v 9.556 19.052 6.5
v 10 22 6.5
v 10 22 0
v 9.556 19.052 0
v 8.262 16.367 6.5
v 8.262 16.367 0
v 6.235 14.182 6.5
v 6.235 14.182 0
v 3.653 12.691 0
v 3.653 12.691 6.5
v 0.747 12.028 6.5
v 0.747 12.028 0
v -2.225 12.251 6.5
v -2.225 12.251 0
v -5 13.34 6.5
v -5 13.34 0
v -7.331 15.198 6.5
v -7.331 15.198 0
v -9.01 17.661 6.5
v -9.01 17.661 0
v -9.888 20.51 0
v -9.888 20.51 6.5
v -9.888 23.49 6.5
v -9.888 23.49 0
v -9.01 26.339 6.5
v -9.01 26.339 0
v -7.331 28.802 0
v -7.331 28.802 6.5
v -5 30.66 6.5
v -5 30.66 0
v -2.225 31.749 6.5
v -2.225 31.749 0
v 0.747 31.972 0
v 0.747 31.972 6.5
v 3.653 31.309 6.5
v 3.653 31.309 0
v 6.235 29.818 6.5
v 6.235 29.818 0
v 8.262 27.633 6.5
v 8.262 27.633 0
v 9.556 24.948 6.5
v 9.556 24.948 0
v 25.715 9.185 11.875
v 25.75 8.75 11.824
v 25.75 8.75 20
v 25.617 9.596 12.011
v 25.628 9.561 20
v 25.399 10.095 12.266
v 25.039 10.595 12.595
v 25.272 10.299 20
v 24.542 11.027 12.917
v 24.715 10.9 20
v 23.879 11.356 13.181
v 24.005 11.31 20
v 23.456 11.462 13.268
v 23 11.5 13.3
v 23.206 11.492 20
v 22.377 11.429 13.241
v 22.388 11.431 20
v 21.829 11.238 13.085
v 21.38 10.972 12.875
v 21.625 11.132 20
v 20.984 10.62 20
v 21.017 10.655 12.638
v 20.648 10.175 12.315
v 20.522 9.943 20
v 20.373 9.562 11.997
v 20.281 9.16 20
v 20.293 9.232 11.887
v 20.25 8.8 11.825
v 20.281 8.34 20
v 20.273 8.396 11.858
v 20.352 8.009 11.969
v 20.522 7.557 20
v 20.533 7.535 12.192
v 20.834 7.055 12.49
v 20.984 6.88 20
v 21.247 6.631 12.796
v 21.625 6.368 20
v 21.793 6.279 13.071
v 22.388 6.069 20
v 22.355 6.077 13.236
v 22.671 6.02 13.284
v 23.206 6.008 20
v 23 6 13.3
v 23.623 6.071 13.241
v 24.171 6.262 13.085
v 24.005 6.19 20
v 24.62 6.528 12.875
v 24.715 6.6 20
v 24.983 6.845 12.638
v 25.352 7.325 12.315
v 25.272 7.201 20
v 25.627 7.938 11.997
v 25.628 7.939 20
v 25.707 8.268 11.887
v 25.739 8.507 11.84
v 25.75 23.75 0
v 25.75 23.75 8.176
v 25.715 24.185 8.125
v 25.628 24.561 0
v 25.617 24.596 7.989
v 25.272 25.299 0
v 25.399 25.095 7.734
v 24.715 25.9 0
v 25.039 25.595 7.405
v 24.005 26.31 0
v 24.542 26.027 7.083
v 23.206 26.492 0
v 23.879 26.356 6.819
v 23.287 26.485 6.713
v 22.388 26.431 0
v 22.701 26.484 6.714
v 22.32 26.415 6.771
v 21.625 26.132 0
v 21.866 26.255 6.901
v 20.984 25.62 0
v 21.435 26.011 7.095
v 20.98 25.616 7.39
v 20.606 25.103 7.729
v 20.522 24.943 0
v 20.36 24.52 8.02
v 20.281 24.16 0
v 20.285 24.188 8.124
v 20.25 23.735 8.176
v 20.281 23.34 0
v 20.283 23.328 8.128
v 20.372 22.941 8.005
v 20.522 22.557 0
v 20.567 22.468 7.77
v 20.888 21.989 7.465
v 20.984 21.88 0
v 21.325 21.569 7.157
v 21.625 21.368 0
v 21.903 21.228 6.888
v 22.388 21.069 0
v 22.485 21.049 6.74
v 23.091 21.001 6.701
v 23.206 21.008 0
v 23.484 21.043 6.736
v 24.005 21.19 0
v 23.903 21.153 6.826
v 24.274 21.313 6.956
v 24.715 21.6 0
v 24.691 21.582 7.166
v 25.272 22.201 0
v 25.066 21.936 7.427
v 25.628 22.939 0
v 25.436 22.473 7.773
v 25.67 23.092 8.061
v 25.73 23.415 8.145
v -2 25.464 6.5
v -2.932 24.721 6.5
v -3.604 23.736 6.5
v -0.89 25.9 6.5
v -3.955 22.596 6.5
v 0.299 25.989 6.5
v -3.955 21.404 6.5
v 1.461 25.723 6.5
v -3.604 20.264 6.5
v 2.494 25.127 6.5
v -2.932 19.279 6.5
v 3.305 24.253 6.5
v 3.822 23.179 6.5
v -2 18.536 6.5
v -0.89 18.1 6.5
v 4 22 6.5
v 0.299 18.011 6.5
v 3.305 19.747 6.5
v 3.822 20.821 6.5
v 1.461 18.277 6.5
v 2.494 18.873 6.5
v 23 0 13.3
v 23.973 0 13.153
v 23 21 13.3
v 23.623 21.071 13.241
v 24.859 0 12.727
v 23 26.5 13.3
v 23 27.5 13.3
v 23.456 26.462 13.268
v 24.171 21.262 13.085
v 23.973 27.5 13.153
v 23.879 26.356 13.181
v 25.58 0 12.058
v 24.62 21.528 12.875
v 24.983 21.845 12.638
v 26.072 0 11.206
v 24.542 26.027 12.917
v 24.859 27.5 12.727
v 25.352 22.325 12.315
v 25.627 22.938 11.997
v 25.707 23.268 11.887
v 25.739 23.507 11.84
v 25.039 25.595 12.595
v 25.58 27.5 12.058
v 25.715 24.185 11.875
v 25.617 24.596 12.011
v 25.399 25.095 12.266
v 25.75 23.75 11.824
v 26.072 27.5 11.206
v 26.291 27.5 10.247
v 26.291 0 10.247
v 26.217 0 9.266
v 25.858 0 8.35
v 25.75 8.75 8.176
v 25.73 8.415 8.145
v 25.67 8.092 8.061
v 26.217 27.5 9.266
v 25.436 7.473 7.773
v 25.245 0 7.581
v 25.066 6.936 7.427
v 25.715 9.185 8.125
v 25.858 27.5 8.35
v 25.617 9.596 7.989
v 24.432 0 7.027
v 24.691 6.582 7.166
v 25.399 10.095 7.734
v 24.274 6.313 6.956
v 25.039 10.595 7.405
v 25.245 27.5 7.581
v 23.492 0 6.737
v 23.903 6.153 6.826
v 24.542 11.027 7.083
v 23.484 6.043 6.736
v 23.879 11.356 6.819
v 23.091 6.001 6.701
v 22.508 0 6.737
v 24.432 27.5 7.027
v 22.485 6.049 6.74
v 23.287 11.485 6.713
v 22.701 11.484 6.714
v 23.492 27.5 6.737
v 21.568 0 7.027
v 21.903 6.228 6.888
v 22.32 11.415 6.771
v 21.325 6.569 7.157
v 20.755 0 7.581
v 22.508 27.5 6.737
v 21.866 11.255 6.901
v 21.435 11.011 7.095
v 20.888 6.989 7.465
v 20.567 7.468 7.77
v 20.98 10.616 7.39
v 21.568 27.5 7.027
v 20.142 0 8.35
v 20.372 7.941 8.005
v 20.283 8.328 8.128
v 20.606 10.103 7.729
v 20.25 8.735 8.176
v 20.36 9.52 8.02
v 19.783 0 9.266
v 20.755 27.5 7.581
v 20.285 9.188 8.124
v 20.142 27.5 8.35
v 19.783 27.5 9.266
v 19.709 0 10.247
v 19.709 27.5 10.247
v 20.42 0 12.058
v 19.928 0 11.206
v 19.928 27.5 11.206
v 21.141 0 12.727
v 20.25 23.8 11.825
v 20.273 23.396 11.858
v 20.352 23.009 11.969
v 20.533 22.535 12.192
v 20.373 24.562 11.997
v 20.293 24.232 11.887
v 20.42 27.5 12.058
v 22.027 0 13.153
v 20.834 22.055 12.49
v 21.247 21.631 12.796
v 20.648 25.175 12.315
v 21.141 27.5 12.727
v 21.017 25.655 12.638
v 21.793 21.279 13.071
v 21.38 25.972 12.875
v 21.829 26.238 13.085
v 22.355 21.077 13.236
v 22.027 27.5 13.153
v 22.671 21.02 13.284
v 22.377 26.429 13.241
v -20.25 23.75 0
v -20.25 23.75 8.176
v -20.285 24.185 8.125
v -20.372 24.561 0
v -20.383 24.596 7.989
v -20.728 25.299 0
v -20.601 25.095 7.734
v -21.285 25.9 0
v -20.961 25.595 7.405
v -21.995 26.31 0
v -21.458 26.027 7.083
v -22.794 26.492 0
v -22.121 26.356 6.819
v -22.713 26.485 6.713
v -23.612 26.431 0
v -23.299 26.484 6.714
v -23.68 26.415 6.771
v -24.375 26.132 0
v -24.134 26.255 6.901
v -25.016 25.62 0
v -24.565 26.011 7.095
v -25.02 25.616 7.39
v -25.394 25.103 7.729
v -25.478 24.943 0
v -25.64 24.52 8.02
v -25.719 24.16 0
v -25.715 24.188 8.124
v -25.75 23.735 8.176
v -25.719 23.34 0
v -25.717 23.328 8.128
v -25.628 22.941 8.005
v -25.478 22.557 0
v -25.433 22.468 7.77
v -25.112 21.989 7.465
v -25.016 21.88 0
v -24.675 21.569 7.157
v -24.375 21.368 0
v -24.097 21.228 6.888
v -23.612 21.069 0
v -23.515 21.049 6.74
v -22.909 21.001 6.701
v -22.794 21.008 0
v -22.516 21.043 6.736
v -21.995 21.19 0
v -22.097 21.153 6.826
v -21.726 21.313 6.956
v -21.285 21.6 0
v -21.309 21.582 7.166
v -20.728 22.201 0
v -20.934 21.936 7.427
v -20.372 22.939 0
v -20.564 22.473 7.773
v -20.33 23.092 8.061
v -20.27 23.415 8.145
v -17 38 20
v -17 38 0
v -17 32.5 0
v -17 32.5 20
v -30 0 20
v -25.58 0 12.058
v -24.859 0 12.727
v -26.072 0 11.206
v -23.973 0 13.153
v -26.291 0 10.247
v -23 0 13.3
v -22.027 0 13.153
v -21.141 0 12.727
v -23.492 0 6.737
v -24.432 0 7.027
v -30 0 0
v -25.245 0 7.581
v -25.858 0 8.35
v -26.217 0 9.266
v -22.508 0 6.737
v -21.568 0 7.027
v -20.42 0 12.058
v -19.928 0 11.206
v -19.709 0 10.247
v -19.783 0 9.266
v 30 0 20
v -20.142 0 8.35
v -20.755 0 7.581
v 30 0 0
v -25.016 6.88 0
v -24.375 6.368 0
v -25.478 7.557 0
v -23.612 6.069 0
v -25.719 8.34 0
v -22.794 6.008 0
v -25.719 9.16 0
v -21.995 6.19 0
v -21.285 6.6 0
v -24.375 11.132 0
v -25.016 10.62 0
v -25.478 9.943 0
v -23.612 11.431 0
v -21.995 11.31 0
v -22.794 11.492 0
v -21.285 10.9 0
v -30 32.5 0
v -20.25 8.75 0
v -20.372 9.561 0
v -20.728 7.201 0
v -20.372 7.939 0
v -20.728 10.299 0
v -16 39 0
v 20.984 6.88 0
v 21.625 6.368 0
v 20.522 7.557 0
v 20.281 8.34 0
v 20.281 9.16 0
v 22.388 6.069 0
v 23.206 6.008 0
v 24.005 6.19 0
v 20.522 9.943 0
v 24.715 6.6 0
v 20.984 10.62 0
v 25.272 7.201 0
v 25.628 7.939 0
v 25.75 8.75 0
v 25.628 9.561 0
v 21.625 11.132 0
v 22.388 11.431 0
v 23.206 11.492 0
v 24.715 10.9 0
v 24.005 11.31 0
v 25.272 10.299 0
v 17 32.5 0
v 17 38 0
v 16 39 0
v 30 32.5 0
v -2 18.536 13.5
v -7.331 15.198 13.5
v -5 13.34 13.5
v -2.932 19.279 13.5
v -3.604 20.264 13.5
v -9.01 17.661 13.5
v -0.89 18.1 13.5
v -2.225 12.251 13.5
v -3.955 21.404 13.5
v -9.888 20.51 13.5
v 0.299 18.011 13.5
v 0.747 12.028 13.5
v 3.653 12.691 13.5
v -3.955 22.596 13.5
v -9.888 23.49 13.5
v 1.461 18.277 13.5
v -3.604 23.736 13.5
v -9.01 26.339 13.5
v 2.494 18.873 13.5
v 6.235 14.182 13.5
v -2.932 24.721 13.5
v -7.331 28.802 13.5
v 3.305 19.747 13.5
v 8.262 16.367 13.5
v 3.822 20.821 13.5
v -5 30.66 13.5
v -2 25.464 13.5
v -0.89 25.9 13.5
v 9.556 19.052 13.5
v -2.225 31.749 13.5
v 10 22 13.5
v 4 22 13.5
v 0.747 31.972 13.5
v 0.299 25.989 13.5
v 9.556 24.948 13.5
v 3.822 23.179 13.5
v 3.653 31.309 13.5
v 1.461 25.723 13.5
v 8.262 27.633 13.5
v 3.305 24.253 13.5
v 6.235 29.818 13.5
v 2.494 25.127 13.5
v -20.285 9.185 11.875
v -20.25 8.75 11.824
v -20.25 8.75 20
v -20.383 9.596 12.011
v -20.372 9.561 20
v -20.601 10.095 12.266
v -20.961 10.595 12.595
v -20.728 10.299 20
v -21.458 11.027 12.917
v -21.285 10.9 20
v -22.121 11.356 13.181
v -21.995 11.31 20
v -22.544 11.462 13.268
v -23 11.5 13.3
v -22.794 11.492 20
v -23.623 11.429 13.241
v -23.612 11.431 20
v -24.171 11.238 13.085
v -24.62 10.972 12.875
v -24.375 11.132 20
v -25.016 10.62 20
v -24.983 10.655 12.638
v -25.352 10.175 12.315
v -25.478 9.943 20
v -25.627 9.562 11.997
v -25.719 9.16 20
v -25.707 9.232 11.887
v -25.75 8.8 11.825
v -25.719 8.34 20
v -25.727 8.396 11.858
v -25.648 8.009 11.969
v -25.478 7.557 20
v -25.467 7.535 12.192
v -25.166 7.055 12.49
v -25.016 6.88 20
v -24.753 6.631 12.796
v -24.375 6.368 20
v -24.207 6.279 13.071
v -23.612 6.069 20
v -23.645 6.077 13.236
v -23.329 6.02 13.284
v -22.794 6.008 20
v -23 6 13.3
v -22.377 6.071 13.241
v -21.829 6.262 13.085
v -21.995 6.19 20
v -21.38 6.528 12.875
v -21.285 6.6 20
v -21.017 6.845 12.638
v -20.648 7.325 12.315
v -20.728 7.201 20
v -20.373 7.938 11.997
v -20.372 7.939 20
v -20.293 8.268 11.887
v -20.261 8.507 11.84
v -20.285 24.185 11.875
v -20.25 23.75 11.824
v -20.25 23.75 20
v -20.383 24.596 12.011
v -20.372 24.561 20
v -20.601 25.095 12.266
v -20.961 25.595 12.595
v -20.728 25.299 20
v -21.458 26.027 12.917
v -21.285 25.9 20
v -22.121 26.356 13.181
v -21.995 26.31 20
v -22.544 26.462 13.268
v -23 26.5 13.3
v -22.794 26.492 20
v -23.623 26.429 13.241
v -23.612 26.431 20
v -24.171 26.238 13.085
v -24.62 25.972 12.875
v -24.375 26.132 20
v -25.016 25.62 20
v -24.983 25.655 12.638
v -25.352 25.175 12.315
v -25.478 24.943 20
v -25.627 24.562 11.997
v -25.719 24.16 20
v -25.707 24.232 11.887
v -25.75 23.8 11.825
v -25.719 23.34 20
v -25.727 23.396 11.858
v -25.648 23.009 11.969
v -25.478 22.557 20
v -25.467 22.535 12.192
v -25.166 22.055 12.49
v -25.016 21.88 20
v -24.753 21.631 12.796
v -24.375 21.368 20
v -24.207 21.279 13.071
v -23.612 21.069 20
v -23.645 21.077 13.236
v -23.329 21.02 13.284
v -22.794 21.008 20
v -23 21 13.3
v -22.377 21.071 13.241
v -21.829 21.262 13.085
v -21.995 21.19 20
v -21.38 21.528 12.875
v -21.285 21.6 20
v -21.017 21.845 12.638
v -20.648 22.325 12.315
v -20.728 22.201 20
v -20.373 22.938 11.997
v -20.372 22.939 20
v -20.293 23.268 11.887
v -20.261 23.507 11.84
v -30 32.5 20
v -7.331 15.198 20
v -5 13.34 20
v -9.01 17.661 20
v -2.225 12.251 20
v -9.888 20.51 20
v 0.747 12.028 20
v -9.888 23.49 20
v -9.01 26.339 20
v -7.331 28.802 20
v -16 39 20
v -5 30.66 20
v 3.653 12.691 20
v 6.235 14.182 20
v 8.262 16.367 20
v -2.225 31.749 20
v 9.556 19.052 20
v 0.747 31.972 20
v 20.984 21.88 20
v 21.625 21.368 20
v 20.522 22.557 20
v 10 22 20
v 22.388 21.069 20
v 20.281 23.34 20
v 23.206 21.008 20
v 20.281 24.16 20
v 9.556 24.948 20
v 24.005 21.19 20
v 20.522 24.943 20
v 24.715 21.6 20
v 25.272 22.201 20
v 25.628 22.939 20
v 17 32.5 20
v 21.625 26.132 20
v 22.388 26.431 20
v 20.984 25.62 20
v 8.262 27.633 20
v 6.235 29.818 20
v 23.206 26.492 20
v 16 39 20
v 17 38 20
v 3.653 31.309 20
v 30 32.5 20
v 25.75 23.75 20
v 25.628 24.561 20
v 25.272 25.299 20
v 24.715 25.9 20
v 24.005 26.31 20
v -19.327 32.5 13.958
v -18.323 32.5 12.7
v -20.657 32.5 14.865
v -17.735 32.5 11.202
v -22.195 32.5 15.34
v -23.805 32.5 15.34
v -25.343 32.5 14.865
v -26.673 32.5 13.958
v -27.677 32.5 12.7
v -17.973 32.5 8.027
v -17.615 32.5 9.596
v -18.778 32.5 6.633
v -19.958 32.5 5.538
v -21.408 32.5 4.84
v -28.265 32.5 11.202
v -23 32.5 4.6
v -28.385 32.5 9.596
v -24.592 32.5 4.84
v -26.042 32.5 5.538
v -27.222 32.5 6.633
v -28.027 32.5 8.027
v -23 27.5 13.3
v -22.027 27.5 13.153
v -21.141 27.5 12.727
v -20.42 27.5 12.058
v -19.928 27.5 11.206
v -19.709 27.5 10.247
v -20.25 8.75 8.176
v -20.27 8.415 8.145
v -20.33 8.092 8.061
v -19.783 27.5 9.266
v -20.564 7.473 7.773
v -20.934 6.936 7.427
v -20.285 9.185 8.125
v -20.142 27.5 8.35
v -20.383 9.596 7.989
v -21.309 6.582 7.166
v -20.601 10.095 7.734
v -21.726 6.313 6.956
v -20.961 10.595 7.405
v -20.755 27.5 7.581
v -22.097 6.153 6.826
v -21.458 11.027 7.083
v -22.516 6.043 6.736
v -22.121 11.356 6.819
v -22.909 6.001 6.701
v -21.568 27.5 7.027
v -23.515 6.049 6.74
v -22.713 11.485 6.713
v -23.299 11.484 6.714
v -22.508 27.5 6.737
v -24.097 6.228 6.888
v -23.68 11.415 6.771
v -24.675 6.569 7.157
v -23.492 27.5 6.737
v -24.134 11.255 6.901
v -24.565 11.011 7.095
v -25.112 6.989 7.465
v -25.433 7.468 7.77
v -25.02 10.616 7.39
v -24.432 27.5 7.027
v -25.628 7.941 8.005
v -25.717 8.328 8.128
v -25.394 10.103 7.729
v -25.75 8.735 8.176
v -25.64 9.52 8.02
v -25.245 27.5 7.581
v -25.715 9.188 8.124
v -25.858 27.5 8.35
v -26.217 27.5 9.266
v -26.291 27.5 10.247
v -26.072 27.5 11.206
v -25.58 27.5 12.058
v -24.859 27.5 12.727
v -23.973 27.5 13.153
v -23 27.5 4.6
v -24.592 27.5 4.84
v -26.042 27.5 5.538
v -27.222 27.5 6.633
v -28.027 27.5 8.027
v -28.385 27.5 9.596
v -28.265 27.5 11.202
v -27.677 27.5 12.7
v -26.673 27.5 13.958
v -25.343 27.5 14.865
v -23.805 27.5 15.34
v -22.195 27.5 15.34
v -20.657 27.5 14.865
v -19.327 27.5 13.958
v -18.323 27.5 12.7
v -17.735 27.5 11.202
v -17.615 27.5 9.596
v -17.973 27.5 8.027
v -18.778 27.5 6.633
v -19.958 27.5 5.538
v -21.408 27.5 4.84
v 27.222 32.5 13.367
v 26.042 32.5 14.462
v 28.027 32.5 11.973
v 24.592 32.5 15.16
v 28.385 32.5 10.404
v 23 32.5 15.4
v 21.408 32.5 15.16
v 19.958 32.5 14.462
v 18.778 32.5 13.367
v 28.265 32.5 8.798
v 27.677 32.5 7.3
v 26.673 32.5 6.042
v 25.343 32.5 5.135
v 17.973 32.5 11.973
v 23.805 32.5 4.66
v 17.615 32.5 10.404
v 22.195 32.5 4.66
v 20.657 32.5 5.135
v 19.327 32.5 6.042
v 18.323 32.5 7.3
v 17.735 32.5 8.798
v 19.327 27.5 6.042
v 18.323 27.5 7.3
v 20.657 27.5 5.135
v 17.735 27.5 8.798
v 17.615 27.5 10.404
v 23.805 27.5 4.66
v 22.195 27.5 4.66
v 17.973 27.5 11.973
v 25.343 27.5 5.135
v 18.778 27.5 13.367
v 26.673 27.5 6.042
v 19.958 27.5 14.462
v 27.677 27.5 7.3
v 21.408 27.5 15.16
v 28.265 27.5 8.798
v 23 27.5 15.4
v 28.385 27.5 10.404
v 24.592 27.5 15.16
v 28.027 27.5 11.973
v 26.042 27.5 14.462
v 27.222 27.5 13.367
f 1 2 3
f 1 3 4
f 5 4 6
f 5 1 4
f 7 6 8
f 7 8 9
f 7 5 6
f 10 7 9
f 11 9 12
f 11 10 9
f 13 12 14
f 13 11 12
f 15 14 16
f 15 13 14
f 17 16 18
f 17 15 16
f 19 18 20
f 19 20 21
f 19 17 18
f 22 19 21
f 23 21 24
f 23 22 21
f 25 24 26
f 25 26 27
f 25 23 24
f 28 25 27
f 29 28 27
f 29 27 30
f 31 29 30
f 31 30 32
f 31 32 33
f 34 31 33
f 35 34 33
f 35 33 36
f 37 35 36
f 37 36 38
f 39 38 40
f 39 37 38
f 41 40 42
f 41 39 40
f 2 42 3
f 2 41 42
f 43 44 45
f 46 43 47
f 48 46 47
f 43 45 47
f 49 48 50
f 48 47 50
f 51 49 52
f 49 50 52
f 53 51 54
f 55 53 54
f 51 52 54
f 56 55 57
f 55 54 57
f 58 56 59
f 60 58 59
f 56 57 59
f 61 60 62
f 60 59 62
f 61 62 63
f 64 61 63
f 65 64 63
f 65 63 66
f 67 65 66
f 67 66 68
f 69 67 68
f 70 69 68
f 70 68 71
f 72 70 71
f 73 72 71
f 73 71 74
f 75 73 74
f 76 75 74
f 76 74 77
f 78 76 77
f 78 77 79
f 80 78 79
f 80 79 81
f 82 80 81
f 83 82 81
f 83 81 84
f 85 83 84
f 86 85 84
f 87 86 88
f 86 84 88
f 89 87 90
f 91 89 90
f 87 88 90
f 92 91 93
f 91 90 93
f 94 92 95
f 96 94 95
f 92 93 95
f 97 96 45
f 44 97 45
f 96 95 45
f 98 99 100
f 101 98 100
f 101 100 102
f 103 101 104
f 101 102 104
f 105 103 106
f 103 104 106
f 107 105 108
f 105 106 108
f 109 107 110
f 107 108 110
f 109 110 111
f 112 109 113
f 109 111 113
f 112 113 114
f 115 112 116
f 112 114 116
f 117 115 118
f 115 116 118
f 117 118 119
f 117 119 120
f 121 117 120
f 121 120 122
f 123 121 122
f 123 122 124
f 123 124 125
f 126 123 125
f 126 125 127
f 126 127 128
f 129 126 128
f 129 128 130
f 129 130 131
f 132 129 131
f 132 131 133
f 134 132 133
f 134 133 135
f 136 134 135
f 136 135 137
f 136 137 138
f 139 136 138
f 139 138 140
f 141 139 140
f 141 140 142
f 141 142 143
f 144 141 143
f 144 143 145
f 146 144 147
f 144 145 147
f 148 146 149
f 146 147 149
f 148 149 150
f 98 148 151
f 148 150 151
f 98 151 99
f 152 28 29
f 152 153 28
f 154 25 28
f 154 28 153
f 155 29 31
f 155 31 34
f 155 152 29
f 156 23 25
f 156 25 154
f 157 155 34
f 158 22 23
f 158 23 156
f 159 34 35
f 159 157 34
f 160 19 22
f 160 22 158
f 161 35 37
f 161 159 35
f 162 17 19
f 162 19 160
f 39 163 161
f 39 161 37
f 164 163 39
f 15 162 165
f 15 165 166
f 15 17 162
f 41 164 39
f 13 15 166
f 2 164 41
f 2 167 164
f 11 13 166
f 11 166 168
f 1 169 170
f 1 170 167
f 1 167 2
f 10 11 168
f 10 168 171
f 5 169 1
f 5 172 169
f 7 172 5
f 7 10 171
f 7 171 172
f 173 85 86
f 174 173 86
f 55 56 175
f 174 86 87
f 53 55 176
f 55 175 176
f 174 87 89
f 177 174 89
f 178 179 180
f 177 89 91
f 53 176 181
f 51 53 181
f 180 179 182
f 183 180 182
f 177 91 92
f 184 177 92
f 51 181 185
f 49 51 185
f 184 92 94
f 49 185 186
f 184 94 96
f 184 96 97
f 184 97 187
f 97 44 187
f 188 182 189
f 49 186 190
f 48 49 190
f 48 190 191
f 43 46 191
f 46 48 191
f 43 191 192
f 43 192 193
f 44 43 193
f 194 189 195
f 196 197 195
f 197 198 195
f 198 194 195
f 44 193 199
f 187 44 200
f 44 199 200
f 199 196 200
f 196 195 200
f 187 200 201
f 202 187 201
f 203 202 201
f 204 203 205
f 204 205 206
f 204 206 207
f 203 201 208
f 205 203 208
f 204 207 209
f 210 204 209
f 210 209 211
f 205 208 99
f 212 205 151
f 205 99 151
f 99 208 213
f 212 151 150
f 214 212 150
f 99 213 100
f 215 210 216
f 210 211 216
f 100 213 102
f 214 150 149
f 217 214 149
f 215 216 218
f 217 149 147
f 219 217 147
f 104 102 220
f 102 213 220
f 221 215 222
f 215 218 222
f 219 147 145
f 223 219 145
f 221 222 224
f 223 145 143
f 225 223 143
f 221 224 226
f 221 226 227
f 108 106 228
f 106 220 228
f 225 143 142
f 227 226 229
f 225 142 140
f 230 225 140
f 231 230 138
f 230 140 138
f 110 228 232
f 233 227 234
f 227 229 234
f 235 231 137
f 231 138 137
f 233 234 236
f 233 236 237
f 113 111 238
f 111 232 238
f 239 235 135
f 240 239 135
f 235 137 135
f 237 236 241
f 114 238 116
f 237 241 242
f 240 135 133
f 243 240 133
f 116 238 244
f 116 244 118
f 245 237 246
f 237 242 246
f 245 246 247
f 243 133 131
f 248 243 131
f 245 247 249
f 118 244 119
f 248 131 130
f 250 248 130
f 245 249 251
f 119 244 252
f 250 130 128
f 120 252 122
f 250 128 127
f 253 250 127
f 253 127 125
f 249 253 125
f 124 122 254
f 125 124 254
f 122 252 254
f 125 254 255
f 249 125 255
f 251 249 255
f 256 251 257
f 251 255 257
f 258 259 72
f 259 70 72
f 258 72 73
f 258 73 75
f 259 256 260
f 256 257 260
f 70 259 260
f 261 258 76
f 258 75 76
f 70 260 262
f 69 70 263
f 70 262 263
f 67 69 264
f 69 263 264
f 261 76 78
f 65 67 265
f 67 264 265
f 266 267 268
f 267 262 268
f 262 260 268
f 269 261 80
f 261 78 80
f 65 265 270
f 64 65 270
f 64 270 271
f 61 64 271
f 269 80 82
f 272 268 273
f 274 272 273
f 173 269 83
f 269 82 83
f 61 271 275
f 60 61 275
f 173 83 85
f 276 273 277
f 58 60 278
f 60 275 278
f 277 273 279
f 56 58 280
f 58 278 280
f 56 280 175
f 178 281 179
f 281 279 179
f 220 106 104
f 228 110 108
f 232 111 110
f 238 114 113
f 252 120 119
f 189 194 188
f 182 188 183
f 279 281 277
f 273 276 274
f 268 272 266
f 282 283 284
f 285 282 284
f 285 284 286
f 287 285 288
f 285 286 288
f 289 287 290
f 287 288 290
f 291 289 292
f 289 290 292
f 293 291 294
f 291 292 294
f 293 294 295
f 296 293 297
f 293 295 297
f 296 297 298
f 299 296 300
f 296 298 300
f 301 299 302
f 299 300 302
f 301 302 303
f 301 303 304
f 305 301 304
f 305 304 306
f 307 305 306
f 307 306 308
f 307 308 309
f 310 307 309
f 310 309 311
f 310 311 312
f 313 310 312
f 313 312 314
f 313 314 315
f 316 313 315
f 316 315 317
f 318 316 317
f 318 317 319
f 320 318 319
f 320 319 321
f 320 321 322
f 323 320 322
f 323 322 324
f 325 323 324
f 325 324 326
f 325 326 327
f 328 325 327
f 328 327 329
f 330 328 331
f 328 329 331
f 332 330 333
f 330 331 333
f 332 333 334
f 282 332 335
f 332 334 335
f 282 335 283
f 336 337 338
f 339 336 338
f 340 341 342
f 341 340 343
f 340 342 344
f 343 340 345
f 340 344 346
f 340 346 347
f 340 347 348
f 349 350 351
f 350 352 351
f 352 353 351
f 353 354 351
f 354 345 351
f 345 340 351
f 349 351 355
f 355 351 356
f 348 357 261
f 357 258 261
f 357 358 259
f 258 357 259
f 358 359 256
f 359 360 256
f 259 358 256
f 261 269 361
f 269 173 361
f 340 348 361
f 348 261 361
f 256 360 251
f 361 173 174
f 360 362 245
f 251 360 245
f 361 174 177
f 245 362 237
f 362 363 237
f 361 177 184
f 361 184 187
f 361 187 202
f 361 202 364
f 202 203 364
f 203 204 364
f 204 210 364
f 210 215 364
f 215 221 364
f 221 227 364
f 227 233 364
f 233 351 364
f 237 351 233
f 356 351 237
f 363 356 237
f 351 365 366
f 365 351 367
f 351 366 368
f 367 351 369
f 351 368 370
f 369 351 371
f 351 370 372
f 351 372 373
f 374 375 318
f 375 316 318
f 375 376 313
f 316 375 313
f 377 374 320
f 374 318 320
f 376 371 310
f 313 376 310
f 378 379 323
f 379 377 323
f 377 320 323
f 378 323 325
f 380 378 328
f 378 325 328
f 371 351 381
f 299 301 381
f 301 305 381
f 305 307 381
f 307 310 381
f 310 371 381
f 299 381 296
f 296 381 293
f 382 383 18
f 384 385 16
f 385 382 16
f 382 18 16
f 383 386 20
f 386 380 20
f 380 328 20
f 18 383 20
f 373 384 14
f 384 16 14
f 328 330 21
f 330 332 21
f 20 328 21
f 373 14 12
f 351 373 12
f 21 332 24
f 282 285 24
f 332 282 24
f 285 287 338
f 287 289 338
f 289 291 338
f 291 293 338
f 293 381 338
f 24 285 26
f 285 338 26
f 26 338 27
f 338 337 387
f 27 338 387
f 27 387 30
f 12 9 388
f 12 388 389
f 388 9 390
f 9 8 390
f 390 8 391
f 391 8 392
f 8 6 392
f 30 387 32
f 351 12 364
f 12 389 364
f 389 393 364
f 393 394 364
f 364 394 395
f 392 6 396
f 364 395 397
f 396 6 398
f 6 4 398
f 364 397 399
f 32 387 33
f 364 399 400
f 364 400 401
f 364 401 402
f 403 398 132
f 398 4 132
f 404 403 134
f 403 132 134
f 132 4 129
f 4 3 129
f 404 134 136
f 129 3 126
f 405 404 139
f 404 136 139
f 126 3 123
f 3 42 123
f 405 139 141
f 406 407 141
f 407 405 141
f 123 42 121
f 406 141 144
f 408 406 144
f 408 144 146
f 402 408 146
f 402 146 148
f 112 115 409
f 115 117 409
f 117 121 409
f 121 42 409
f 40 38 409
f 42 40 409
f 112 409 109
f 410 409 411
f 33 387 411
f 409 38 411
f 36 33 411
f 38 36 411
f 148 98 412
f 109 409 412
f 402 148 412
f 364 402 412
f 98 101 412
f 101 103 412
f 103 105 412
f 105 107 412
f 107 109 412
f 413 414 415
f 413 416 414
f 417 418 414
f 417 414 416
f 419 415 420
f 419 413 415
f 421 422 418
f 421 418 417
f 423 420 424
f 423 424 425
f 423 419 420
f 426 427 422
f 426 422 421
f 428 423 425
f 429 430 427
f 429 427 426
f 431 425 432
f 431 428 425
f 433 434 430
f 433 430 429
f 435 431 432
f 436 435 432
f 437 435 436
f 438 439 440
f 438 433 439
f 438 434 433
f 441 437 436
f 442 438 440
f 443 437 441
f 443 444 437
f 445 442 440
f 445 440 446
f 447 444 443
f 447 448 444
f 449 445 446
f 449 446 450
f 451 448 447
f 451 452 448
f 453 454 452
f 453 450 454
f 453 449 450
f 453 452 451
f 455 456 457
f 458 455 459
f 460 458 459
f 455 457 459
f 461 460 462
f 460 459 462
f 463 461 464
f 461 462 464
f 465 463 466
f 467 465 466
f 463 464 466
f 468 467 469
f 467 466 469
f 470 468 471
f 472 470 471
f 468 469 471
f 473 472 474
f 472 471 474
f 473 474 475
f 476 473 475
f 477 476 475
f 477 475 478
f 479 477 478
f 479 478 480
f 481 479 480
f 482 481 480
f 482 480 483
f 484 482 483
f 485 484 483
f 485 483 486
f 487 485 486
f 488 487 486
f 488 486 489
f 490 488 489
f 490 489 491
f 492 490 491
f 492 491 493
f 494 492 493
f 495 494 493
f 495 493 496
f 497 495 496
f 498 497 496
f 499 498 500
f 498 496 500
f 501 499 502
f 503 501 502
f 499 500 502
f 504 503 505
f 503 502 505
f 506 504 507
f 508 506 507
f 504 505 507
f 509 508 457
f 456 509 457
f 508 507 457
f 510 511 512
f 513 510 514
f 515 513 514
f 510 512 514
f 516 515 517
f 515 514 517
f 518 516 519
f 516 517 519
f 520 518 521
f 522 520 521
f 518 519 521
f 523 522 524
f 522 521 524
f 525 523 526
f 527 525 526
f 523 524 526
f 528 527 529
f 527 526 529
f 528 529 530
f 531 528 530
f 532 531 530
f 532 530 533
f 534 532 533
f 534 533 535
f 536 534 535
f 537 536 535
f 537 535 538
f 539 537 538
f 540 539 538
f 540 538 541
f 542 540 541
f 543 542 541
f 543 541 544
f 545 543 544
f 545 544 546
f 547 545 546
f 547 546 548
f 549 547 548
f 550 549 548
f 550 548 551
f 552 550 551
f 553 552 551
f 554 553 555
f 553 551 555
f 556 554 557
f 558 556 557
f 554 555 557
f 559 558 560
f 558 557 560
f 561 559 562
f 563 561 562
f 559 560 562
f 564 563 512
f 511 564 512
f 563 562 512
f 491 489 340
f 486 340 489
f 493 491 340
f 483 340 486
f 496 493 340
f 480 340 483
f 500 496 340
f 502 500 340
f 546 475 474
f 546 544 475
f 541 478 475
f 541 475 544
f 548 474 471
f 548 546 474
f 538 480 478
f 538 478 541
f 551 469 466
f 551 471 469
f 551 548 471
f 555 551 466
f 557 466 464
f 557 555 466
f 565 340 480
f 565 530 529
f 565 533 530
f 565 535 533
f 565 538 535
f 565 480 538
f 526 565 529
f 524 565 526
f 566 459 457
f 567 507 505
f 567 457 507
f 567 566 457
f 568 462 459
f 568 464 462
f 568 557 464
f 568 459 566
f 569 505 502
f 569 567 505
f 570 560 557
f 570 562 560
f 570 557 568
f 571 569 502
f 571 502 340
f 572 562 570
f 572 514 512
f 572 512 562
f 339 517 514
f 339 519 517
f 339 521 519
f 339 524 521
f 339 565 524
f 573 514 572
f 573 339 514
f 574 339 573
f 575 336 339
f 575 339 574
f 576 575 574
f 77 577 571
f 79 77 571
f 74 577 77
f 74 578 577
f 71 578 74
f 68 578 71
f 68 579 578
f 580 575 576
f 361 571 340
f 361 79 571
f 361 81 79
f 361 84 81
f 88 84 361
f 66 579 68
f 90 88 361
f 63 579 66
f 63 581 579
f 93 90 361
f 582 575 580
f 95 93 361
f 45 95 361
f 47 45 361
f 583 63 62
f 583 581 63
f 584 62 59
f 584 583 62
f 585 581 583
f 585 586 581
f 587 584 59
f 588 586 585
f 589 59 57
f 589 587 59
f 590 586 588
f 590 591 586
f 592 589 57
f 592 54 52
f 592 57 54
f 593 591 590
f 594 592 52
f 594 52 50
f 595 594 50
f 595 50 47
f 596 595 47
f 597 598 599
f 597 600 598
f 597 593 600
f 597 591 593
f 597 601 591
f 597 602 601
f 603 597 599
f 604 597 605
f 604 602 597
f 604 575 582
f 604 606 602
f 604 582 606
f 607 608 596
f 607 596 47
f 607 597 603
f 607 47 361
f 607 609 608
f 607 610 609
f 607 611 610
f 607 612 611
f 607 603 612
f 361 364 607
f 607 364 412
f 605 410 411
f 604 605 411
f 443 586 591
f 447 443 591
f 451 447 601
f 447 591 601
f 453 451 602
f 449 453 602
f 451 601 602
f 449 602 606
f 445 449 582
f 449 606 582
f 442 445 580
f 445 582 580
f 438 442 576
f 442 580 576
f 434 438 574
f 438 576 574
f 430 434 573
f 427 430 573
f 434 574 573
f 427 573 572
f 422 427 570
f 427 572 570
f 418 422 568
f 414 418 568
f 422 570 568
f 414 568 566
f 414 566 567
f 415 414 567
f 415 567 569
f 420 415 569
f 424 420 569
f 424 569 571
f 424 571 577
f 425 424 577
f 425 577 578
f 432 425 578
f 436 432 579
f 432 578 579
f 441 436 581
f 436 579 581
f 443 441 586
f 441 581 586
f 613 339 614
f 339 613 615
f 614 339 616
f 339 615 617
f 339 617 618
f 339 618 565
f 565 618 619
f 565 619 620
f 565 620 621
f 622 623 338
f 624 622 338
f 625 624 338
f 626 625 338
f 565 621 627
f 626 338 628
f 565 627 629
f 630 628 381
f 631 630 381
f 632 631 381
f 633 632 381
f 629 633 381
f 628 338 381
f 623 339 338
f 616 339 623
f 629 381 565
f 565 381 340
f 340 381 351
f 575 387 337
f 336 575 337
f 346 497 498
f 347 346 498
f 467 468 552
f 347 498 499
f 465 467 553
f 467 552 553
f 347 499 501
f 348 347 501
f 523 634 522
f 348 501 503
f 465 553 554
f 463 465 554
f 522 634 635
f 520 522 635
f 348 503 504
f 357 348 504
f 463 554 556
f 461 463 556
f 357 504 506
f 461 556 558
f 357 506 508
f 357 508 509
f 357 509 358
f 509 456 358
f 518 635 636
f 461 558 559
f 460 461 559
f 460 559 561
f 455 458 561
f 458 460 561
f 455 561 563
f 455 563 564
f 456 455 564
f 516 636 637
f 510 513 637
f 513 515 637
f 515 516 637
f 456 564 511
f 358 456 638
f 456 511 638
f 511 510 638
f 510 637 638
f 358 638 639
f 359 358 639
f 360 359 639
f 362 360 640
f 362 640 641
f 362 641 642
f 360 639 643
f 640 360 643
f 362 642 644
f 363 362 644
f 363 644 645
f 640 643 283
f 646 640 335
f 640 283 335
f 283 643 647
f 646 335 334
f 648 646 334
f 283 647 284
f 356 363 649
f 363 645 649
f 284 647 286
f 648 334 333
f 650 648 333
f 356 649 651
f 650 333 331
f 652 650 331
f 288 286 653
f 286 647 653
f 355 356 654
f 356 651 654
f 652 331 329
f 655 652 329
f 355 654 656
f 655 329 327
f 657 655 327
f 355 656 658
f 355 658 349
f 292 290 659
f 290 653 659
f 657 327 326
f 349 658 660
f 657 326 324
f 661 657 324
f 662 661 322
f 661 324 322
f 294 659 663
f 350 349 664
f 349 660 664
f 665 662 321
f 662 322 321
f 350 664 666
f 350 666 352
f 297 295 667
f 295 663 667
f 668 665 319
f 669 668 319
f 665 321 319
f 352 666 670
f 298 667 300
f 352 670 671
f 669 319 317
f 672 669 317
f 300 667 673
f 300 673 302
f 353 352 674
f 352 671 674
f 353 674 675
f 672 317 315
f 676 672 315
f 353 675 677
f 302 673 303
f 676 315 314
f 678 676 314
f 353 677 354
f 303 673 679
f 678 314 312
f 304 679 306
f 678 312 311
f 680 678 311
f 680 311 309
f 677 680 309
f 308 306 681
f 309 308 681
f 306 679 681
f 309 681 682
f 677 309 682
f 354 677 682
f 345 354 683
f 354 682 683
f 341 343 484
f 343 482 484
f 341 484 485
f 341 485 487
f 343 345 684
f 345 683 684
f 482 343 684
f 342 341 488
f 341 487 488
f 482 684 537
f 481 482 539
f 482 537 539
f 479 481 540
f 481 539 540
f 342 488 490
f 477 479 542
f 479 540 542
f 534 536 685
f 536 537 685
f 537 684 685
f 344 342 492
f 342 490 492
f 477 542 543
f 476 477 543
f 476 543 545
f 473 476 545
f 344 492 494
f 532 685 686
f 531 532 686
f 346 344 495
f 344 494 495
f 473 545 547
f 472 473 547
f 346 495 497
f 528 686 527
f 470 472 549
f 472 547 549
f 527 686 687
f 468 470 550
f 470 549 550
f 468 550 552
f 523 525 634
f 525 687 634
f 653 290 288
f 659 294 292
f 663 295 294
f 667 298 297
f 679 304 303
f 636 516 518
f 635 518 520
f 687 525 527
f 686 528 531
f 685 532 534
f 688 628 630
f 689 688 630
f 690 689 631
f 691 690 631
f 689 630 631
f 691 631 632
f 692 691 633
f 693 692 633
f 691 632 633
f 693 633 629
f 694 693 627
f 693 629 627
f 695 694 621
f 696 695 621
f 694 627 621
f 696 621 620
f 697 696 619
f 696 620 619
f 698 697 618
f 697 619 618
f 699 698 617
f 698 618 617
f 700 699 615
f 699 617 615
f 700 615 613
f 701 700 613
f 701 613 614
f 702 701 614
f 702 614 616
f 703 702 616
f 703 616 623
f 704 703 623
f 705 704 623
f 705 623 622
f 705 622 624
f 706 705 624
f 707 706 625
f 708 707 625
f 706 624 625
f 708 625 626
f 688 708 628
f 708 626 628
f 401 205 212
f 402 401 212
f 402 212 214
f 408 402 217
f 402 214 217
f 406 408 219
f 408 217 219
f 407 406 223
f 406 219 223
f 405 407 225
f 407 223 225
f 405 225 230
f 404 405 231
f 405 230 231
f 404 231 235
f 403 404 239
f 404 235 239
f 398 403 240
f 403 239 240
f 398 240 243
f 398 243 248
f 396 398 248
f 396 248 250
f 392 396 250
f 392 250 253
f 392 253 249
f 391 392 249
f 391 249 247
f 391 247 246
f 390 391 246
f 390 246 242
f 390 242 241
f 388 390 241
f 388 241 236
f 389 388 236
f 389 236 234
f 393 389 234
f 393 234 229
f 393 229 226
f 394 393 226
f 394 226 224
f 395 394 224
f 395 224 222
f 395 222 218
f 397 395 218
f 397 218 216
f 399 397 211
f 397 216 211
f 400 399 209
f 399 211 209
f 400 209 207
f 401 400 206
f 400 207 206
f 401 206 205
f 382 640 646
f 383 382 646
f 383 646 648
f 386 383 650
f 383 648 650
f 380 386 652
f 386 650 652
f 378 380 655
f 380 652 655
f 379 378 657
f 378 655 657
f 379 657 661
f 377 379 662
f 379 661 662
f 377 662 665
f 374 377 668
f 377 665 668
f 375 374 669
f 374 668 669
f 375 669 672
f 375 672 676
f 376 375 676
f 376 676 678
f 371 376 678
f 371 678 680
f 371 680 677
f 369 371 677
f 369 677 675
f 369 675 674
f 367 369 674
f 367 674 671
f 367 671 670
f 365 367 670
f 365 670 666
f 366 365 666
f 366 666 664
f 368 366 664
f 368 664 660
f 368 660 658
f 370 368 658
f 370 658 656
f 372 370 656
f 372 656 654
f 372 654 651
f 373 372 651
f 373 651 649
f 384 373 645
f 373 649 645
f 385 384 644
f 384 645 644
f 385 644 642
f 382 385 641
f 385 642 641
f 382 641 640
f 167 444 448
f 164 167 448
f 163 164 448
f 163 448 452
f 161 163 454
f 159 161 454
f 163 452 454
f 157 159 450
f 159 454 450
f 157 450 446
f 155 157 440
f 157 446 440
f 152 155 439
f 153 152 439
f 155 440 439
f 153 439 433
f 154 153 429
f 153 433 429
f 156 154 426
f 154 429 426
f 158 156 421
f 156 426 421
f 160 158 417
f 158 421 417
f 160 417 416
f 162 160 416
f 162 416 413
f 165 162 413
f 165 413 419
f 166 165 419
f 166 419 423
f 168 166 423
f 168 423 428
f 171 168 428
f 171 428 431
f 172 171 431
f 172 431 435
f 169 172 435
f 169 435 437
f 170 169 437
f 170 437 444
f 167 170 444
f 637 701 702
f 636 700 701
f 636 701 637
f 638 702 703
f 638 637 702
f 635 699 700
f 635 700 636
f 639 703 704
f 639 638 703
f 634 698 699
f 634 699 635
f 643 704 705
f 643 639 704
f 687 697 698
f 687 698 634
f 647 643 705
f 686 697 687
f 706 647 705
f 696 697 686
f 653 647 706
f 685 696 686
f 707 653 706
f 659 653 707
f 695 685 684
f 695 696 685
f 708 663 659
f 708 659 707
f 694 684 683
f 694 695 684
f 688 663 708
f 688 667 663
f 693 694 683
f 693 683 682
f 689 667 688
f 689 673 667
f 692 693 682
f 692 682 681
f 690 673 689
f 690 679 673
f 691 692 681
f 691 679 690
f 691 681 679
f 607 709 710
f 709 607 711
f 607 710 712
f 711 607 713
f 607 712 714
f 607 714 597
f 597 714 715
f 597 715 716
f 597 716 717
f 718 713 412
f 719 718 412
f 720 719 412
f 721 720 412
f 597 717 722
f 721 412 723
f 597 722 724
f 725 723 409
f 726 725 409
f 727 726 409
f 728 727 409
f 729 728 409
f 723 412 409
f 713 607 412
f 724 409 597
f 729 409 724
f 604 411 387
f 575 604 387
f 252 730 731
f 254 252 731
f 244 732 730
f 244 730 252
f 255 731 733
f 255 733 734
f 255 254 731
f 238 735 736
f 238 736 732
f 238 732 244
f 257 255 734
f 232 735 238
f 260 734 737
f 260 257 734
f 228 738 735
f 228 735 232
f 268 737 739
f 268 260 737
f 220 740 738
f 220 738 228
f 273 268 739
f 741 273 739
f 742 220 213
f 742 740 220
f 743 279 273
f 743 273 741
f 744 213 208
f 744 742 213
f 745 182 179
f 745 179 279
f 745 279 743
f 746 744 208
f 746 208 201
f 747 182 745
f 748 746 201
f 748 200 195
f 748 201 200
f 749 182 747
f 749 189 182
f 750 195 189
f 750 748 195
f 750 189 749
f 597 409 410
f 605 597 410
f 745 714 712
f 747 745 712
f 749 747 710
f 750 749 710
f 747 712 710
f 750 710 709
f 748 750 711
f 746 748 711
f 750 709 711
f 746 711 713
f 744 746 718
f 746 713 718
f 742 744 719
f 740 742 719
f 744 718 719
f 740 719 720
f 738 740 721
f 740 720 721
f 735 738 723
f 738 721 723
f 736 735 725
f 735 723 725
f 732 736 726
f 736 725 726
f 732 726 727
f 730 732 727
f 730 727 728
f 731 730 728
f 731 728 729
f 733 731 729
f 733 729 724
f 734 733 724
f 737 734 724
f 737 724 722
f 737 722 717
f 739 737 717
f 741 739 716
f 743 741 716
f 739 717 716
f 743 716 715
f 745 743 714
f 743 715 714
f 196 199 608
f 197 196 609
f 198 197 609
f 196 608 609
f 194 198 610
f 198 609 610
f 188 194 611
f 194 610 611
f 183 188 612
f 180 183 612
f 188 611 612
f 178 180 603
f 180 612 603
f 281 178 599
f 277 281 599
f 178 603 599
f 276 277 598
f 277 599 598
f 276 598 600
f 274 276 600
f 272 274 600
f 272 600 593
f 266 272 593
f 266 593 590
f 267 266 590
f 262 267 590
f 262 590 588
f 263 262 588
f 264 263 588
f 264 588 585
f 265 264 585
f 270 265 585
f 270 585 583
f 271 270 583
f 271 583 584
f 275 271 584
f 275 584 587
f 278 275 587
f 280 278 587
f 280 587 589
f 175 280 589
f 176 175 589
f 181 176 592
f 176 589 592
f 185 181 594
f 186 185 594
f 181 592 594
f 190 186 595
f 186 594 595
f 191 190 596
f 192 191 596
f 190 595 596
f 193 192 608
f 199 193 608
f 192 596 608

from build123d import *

# Parameters (mm, degrees)
AUFSATZ_LINEAR_AUSTRAGEN1_DEPTH = 20
SKIZZE4_R                       = 3.3
SCHNITT_LINEAR_AUSTRAGEN2_DEPTH = 50
SKIZZE5_R                       = 5.4
SCHNITT_LINEAR_AUSTRAGEN3_DEPTH = 5
SKIZZE6_R                       = 2.75
SCHNITT_LINEAR_AUSTRAGEN4_DEPTH = 50
SKIZZE7_R                       = 4
SCHNITT_LINEAR_AUSTRAGEN5_DEPTH = 50
SKIZZE8_R                       = 10
SCHNITT_LINEAR_AUSTRAGEN6_DEPTH = 6.5
SCHNITT_LINEAR_START            = -6.5
SKIZZE9_R                       = 10
SCHNITT_LINEAR_AUSTRAGEN7_DEPTH = 6.5


with BuildPart() as part:
    # Skizze1 → Aufsatz-Linear austragen1 (new body)
    with BuildSketch(Plane.XY):
        Polygon((-30, 0), (30, 0), (30, 32.5), (17, 32.5), (17, 38), (16, 39), (-16, 39), (-17, 38), (-17, 32.5), (-30, 32.5), align=None)
    extrude(amount=AUFSATZ_LINEAR_AUSTRAGEN1_DEPTH)

    # Skizze4 → Schnitt-Linear austragen2 (cut)
    with BuildSketch(Plane(origin=(0, 32.5, 0), x_dir=(1, 0, 0), z_dir=(0, 1, 0))):
        with Locations(Location((23, -10, 0), (0, 0, 270))):
            Circle(SKIZZE4_R)
        with Locations(Location((-23, -10, 0), (0, 0, 270))):
            Circle(SKIZZE4_R)
    extrude(amount=-SCHNITT_LINEAR_AUSTRAGEN2_DEPTH, mode=Mode.SUBTRACT)

    # Skizze5 → Schnitt-Linear austragen3 (cut)
    with BuildSketch(Plane(origin=(0, 32.5, 0), x_dir=(1, 0, 0), z_dir=(0, 1, 0))):
        with Locations(Location((23, -10, 0), (0, 0, 270))):
            Circle(SKIZZE5_R)
        with Locations(Location((-23, -10, 0), (0, 0, 90))):
            Circle(SKIZZE5_R)
    extrude(amount=-SCHNITT_LINEAR_AUSTRAGEN3_DEPTH, mode=Mode.SUBTRACT)

    # Skizze6 → Schnitt-Linear austragen4 (cut)
    with BuildSketch(Plane.XY.offset(20)):
        with Locations((23, 23.75)):
            Circle(SKIZZE6_R)
        with Locations((23, 8.75)):
            Circle(SKIZZE6_R)
        with Locations((-23, 23.75)):
            Circle(SKIZZE6_R)
        with Locations((-23, 8.75)):
            Circle(SKIZZE6_R)
    extrude(amount=-SCHNITT_LINEAR_AUSTRAGEN4_DEPTH, mode=Mode.SUBTRACT)

    # Skizze7 → Schnitt-Linear austragen5 (cut)
    with BuildSketch(Plane.XY.offset(20)):
        with Locations((0, 22)):
            Circle(SKIZZE7_R)
    extrude(amount=-SCHNITT_LINEAR_AUSTRAGEN5_DEPTH, mode=Mode.SUBTRACT)

    # Skizze8 → Schnitt-Linear austragen6 (cut)
    with BuildSketch(Plane.XY.offset(20)):
        with Locations((0, 22)):
            Circle(SKIZZE8_R)
    extrude(amount=-SCHNITT_LINEAR_AUSTRAGEN6_DEPTH, mode=Mode.SUBTRACT)

    # Skizze9 → Schnitt-Linear austragen7 (cut)
    with BuildSketch(Plane(origin=(0, 0, 0), x_dir=(-1, 0, 0), z_dir=(0, 0, -1)).offset(SCHNITT_LINEAR_START)):
        with Locations(Location((0, 22, 0), (0, 0, 180))):
            Circle(SKIZZE9_R)
    extrude(amount=SCHNITT_LINEAR_AUSTRAGEN7_DEPTH, mode=Mode.SUBTRACT)


solid = part.part
